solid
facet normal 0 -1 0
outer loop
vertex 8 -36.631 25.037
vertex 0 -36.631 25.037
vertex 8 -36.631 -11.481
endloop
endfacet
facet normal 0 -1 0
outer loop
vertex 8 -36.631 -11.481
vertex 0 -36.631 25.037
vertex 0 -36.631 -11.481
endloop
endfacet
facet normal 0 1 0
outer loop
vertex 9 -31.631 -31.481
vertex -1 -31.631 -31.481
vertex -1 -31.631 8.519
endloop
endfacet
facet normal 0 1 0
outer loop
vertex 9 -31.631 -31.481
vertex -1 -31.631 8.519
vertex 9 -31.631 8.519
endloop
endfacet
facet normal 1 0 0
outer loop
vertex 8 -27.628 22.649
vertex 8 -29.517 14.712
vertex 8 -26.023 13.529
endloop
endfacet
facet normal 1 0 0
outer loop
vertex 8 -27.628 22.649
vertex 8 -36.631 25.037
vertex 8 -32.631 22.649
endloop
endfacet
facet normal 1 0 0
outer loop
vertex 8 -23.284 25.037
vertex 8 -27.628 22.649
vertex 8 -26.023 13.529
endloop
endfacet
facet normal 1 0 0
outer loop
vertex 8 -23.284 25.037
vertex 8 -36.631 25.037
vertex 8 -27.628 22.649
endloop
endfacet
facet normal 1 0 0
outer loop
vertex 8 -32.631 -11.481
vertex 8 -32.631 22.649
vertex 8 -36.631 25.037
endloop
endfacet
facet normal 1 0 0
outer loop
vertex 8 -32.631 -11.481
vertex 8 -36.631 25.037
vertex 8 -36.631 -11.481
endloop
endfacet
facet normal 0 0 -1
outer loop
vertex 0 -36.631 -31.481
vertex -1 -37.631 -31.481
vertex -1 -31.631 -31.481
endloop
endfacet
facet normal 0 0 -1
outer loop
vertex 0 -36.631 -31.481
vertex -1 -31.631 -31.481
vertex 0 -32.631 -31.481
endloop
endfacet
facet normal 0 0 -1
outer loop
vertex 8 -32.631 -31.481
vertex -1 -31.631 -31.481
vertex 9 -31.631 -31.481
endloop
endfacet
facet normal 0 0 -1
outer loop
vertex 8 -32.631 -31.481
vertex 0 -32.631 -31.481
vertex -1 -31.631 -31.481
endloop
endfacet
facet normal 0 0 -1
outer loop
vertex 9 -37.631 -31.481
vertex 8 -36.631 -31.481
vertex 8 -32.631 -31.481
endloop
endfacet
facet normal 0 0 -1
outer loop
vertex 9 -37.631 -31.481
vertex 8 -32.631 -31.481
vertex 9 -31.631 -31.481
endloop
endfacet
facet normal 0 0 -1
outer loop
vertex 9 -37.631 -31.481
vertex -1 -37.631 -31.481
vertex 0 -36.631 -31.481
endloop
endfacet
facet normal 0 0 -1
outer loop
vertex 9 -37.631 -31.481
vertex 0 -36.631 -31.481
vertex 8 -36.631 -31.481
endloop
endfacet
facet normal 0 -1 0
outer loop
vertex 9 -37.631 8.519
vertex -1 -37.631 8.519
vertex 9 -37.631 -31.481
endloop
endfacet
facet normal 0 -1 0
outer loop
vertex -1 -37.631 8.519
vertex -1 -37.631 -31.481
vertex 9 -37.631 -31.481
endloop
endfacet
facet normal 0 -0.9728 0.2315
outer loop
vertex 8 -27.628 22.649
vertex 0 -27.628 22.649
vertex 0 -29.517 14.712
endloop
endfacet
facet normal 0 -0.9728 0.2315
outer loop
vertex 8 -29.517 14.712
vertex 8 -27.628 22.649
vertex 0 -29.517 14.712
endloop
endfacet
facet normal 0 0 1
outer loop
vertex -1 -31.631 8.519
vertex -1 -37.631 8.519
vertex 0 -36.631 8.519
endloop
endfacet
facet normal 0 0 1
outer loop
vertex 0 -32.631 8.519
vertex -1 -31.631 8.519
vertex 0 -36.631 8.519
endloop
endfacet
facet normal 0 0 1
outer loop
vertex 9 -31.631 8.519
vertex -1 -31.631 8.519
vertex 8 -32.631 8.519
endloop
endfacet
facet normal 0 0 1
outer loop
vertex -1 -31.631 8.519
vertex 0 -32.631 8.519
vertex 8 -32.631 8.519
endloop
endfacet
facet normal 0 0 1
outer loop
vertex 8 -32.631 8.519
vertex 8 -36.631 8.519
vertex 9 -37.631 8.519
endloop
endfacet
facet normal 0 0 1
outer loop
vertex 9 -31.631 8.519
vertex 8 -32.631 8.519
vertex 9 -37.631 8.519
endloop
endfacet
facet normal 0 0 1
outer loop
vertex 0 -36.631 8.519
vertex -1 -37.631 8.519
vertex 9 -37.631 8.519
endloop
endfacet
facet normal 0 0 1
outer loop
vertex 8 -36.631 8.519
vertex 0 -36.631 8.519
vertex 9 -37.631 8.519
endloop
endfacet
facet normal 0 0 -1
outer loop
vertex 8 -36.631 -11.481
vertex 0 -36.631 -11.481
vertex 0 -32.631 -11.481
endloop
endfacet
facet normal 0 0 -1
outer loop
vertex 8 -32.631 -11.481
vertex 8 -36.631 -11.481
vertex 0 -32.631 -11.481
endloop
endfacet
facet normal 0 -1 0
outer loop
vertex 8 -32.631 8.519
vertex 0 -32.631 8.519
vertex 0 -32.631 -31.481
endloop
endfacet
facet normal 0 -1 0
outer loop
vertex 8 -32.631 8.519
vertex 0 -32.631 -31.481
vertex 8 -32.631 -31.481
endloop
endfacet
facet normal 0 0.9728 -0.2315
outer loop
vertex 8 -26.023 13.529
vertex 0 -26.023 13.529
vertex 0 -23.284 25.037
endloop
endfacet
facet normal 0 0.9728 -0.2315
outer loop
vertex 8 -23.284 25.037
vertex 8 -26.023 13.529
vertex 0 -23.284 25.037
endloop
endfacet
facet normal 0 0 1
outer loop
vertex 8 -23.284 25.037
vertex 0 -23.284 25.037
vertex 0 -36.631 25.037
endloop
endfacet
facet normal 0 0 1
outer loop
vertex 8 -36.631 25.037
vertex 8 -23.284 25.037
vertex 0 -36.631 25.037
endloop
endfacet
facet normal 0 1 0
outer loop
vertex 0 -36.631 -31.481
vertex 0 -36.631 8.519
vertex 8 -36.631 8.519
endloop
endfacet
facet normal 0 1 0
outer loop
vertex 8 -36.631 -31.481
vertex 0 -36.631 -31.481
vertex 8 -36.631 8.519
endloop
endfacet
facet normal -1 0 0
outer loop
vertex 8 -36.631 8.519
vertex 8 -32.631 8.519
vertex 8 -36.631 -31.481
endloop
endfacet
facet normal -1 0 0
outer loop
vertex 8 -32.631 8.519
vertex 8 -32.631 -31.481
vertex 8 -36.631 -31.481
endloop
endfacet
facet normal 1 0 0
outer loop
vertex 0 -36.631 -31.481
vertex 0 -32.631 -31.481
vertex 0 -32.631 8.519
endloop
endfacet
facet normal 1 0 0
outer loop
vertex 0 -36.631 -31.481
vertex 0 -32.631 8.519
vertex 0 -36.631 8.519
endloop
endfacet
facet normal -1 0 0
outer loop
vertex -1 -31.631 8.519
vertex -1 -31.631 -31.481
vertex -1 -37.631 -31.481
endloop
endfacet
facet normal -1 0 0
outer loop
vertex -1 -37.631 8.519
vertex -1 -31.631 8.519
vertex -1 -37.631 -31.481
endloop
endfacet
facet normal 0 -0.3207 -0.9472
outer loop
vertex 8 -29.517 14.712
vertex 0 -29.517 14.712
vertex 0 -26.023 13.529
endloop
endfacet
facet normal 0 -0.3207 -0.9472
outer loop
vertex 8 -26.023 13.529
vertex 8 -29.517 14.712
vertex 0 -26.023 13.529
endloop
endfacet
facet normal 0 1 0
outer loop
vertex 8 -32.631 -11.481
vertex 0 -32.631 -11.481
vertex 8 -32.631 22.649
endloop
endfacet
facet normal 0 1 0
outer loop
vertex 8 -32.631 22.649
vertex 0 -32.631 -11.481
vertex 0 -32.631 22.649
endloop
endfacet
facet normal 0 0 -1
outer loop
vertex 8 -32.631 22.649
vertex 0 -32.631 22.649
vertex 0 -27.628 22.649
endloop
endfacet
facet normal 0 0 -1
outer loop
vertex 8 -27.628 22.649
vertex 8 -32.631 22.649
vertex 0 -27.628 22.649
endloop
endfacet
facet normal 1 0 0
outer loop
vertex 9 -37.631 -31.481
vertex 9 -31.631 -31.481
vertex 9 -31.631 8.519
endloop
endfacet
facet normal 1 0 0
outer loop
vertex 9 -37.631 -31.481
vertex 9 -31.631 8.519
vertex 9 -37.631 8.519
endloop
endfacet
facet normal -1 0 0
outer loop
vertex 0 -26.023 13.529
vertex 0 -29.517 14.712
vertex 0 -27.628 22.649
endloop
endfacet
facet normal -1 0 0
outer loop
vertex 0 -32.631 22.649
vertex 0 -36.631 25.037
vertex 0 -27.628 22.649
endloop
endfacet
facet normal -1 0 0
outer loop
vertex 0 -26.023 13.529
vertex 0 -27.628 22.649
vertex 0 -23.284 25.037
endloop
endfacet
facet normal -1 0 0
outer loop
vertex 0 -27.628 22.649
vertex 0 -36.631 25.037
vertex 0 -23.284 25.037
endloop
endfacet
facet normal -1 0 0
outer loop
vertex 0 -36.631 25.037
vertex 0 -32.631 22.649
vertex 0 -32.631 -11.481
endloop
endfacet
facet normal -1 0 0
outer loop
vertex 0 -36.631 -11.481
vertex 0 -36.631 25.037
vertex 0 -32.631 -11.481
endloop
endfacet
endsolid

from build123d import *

# Parameters (mm, degrees)
F1_DEPTH = 8
F2_W     = 10
F2_H     = 6
F2_W_2   = 8
F2_H_2   = 4
F3_DEPTH = 20


with BuildPart() as f1:
    # F0 (on Right) → F1 (new body)
    with BuildSketch(Plane.YZ):
        Polygon((-32.631335, -11.481153), (-32.631335, 22.648999), (-27.627911, 22.648999), (-29.517183, 14.711965), (-26.023025, 13.529498), (-23.283836, 25.037128), (-36.631335, 25.037128), (-36.631335, -11.481153), align=None)
    extrude(amount=F1_DEPTH)


with BuildPart() as f3:
    # F2 (on face) → F3 (new body, symmetric)
    with BuildSketch(Plane(origin=(0, 0, -11.481153), x_dir=(1, 0, 0), z_dir=(0, 0, -1))):
        with Locations((4, 34.631335)):
            Rectangle(F2_W, F2_H)
        with Locations((4, 34.631335)):
            Rectangle(F2_W_2, F2_H_2, mode=Mode.SUBTRACT)
    extrude(amount=F3_DEPTH, both=True)


solid = Compound([f1.part, f3.part])
